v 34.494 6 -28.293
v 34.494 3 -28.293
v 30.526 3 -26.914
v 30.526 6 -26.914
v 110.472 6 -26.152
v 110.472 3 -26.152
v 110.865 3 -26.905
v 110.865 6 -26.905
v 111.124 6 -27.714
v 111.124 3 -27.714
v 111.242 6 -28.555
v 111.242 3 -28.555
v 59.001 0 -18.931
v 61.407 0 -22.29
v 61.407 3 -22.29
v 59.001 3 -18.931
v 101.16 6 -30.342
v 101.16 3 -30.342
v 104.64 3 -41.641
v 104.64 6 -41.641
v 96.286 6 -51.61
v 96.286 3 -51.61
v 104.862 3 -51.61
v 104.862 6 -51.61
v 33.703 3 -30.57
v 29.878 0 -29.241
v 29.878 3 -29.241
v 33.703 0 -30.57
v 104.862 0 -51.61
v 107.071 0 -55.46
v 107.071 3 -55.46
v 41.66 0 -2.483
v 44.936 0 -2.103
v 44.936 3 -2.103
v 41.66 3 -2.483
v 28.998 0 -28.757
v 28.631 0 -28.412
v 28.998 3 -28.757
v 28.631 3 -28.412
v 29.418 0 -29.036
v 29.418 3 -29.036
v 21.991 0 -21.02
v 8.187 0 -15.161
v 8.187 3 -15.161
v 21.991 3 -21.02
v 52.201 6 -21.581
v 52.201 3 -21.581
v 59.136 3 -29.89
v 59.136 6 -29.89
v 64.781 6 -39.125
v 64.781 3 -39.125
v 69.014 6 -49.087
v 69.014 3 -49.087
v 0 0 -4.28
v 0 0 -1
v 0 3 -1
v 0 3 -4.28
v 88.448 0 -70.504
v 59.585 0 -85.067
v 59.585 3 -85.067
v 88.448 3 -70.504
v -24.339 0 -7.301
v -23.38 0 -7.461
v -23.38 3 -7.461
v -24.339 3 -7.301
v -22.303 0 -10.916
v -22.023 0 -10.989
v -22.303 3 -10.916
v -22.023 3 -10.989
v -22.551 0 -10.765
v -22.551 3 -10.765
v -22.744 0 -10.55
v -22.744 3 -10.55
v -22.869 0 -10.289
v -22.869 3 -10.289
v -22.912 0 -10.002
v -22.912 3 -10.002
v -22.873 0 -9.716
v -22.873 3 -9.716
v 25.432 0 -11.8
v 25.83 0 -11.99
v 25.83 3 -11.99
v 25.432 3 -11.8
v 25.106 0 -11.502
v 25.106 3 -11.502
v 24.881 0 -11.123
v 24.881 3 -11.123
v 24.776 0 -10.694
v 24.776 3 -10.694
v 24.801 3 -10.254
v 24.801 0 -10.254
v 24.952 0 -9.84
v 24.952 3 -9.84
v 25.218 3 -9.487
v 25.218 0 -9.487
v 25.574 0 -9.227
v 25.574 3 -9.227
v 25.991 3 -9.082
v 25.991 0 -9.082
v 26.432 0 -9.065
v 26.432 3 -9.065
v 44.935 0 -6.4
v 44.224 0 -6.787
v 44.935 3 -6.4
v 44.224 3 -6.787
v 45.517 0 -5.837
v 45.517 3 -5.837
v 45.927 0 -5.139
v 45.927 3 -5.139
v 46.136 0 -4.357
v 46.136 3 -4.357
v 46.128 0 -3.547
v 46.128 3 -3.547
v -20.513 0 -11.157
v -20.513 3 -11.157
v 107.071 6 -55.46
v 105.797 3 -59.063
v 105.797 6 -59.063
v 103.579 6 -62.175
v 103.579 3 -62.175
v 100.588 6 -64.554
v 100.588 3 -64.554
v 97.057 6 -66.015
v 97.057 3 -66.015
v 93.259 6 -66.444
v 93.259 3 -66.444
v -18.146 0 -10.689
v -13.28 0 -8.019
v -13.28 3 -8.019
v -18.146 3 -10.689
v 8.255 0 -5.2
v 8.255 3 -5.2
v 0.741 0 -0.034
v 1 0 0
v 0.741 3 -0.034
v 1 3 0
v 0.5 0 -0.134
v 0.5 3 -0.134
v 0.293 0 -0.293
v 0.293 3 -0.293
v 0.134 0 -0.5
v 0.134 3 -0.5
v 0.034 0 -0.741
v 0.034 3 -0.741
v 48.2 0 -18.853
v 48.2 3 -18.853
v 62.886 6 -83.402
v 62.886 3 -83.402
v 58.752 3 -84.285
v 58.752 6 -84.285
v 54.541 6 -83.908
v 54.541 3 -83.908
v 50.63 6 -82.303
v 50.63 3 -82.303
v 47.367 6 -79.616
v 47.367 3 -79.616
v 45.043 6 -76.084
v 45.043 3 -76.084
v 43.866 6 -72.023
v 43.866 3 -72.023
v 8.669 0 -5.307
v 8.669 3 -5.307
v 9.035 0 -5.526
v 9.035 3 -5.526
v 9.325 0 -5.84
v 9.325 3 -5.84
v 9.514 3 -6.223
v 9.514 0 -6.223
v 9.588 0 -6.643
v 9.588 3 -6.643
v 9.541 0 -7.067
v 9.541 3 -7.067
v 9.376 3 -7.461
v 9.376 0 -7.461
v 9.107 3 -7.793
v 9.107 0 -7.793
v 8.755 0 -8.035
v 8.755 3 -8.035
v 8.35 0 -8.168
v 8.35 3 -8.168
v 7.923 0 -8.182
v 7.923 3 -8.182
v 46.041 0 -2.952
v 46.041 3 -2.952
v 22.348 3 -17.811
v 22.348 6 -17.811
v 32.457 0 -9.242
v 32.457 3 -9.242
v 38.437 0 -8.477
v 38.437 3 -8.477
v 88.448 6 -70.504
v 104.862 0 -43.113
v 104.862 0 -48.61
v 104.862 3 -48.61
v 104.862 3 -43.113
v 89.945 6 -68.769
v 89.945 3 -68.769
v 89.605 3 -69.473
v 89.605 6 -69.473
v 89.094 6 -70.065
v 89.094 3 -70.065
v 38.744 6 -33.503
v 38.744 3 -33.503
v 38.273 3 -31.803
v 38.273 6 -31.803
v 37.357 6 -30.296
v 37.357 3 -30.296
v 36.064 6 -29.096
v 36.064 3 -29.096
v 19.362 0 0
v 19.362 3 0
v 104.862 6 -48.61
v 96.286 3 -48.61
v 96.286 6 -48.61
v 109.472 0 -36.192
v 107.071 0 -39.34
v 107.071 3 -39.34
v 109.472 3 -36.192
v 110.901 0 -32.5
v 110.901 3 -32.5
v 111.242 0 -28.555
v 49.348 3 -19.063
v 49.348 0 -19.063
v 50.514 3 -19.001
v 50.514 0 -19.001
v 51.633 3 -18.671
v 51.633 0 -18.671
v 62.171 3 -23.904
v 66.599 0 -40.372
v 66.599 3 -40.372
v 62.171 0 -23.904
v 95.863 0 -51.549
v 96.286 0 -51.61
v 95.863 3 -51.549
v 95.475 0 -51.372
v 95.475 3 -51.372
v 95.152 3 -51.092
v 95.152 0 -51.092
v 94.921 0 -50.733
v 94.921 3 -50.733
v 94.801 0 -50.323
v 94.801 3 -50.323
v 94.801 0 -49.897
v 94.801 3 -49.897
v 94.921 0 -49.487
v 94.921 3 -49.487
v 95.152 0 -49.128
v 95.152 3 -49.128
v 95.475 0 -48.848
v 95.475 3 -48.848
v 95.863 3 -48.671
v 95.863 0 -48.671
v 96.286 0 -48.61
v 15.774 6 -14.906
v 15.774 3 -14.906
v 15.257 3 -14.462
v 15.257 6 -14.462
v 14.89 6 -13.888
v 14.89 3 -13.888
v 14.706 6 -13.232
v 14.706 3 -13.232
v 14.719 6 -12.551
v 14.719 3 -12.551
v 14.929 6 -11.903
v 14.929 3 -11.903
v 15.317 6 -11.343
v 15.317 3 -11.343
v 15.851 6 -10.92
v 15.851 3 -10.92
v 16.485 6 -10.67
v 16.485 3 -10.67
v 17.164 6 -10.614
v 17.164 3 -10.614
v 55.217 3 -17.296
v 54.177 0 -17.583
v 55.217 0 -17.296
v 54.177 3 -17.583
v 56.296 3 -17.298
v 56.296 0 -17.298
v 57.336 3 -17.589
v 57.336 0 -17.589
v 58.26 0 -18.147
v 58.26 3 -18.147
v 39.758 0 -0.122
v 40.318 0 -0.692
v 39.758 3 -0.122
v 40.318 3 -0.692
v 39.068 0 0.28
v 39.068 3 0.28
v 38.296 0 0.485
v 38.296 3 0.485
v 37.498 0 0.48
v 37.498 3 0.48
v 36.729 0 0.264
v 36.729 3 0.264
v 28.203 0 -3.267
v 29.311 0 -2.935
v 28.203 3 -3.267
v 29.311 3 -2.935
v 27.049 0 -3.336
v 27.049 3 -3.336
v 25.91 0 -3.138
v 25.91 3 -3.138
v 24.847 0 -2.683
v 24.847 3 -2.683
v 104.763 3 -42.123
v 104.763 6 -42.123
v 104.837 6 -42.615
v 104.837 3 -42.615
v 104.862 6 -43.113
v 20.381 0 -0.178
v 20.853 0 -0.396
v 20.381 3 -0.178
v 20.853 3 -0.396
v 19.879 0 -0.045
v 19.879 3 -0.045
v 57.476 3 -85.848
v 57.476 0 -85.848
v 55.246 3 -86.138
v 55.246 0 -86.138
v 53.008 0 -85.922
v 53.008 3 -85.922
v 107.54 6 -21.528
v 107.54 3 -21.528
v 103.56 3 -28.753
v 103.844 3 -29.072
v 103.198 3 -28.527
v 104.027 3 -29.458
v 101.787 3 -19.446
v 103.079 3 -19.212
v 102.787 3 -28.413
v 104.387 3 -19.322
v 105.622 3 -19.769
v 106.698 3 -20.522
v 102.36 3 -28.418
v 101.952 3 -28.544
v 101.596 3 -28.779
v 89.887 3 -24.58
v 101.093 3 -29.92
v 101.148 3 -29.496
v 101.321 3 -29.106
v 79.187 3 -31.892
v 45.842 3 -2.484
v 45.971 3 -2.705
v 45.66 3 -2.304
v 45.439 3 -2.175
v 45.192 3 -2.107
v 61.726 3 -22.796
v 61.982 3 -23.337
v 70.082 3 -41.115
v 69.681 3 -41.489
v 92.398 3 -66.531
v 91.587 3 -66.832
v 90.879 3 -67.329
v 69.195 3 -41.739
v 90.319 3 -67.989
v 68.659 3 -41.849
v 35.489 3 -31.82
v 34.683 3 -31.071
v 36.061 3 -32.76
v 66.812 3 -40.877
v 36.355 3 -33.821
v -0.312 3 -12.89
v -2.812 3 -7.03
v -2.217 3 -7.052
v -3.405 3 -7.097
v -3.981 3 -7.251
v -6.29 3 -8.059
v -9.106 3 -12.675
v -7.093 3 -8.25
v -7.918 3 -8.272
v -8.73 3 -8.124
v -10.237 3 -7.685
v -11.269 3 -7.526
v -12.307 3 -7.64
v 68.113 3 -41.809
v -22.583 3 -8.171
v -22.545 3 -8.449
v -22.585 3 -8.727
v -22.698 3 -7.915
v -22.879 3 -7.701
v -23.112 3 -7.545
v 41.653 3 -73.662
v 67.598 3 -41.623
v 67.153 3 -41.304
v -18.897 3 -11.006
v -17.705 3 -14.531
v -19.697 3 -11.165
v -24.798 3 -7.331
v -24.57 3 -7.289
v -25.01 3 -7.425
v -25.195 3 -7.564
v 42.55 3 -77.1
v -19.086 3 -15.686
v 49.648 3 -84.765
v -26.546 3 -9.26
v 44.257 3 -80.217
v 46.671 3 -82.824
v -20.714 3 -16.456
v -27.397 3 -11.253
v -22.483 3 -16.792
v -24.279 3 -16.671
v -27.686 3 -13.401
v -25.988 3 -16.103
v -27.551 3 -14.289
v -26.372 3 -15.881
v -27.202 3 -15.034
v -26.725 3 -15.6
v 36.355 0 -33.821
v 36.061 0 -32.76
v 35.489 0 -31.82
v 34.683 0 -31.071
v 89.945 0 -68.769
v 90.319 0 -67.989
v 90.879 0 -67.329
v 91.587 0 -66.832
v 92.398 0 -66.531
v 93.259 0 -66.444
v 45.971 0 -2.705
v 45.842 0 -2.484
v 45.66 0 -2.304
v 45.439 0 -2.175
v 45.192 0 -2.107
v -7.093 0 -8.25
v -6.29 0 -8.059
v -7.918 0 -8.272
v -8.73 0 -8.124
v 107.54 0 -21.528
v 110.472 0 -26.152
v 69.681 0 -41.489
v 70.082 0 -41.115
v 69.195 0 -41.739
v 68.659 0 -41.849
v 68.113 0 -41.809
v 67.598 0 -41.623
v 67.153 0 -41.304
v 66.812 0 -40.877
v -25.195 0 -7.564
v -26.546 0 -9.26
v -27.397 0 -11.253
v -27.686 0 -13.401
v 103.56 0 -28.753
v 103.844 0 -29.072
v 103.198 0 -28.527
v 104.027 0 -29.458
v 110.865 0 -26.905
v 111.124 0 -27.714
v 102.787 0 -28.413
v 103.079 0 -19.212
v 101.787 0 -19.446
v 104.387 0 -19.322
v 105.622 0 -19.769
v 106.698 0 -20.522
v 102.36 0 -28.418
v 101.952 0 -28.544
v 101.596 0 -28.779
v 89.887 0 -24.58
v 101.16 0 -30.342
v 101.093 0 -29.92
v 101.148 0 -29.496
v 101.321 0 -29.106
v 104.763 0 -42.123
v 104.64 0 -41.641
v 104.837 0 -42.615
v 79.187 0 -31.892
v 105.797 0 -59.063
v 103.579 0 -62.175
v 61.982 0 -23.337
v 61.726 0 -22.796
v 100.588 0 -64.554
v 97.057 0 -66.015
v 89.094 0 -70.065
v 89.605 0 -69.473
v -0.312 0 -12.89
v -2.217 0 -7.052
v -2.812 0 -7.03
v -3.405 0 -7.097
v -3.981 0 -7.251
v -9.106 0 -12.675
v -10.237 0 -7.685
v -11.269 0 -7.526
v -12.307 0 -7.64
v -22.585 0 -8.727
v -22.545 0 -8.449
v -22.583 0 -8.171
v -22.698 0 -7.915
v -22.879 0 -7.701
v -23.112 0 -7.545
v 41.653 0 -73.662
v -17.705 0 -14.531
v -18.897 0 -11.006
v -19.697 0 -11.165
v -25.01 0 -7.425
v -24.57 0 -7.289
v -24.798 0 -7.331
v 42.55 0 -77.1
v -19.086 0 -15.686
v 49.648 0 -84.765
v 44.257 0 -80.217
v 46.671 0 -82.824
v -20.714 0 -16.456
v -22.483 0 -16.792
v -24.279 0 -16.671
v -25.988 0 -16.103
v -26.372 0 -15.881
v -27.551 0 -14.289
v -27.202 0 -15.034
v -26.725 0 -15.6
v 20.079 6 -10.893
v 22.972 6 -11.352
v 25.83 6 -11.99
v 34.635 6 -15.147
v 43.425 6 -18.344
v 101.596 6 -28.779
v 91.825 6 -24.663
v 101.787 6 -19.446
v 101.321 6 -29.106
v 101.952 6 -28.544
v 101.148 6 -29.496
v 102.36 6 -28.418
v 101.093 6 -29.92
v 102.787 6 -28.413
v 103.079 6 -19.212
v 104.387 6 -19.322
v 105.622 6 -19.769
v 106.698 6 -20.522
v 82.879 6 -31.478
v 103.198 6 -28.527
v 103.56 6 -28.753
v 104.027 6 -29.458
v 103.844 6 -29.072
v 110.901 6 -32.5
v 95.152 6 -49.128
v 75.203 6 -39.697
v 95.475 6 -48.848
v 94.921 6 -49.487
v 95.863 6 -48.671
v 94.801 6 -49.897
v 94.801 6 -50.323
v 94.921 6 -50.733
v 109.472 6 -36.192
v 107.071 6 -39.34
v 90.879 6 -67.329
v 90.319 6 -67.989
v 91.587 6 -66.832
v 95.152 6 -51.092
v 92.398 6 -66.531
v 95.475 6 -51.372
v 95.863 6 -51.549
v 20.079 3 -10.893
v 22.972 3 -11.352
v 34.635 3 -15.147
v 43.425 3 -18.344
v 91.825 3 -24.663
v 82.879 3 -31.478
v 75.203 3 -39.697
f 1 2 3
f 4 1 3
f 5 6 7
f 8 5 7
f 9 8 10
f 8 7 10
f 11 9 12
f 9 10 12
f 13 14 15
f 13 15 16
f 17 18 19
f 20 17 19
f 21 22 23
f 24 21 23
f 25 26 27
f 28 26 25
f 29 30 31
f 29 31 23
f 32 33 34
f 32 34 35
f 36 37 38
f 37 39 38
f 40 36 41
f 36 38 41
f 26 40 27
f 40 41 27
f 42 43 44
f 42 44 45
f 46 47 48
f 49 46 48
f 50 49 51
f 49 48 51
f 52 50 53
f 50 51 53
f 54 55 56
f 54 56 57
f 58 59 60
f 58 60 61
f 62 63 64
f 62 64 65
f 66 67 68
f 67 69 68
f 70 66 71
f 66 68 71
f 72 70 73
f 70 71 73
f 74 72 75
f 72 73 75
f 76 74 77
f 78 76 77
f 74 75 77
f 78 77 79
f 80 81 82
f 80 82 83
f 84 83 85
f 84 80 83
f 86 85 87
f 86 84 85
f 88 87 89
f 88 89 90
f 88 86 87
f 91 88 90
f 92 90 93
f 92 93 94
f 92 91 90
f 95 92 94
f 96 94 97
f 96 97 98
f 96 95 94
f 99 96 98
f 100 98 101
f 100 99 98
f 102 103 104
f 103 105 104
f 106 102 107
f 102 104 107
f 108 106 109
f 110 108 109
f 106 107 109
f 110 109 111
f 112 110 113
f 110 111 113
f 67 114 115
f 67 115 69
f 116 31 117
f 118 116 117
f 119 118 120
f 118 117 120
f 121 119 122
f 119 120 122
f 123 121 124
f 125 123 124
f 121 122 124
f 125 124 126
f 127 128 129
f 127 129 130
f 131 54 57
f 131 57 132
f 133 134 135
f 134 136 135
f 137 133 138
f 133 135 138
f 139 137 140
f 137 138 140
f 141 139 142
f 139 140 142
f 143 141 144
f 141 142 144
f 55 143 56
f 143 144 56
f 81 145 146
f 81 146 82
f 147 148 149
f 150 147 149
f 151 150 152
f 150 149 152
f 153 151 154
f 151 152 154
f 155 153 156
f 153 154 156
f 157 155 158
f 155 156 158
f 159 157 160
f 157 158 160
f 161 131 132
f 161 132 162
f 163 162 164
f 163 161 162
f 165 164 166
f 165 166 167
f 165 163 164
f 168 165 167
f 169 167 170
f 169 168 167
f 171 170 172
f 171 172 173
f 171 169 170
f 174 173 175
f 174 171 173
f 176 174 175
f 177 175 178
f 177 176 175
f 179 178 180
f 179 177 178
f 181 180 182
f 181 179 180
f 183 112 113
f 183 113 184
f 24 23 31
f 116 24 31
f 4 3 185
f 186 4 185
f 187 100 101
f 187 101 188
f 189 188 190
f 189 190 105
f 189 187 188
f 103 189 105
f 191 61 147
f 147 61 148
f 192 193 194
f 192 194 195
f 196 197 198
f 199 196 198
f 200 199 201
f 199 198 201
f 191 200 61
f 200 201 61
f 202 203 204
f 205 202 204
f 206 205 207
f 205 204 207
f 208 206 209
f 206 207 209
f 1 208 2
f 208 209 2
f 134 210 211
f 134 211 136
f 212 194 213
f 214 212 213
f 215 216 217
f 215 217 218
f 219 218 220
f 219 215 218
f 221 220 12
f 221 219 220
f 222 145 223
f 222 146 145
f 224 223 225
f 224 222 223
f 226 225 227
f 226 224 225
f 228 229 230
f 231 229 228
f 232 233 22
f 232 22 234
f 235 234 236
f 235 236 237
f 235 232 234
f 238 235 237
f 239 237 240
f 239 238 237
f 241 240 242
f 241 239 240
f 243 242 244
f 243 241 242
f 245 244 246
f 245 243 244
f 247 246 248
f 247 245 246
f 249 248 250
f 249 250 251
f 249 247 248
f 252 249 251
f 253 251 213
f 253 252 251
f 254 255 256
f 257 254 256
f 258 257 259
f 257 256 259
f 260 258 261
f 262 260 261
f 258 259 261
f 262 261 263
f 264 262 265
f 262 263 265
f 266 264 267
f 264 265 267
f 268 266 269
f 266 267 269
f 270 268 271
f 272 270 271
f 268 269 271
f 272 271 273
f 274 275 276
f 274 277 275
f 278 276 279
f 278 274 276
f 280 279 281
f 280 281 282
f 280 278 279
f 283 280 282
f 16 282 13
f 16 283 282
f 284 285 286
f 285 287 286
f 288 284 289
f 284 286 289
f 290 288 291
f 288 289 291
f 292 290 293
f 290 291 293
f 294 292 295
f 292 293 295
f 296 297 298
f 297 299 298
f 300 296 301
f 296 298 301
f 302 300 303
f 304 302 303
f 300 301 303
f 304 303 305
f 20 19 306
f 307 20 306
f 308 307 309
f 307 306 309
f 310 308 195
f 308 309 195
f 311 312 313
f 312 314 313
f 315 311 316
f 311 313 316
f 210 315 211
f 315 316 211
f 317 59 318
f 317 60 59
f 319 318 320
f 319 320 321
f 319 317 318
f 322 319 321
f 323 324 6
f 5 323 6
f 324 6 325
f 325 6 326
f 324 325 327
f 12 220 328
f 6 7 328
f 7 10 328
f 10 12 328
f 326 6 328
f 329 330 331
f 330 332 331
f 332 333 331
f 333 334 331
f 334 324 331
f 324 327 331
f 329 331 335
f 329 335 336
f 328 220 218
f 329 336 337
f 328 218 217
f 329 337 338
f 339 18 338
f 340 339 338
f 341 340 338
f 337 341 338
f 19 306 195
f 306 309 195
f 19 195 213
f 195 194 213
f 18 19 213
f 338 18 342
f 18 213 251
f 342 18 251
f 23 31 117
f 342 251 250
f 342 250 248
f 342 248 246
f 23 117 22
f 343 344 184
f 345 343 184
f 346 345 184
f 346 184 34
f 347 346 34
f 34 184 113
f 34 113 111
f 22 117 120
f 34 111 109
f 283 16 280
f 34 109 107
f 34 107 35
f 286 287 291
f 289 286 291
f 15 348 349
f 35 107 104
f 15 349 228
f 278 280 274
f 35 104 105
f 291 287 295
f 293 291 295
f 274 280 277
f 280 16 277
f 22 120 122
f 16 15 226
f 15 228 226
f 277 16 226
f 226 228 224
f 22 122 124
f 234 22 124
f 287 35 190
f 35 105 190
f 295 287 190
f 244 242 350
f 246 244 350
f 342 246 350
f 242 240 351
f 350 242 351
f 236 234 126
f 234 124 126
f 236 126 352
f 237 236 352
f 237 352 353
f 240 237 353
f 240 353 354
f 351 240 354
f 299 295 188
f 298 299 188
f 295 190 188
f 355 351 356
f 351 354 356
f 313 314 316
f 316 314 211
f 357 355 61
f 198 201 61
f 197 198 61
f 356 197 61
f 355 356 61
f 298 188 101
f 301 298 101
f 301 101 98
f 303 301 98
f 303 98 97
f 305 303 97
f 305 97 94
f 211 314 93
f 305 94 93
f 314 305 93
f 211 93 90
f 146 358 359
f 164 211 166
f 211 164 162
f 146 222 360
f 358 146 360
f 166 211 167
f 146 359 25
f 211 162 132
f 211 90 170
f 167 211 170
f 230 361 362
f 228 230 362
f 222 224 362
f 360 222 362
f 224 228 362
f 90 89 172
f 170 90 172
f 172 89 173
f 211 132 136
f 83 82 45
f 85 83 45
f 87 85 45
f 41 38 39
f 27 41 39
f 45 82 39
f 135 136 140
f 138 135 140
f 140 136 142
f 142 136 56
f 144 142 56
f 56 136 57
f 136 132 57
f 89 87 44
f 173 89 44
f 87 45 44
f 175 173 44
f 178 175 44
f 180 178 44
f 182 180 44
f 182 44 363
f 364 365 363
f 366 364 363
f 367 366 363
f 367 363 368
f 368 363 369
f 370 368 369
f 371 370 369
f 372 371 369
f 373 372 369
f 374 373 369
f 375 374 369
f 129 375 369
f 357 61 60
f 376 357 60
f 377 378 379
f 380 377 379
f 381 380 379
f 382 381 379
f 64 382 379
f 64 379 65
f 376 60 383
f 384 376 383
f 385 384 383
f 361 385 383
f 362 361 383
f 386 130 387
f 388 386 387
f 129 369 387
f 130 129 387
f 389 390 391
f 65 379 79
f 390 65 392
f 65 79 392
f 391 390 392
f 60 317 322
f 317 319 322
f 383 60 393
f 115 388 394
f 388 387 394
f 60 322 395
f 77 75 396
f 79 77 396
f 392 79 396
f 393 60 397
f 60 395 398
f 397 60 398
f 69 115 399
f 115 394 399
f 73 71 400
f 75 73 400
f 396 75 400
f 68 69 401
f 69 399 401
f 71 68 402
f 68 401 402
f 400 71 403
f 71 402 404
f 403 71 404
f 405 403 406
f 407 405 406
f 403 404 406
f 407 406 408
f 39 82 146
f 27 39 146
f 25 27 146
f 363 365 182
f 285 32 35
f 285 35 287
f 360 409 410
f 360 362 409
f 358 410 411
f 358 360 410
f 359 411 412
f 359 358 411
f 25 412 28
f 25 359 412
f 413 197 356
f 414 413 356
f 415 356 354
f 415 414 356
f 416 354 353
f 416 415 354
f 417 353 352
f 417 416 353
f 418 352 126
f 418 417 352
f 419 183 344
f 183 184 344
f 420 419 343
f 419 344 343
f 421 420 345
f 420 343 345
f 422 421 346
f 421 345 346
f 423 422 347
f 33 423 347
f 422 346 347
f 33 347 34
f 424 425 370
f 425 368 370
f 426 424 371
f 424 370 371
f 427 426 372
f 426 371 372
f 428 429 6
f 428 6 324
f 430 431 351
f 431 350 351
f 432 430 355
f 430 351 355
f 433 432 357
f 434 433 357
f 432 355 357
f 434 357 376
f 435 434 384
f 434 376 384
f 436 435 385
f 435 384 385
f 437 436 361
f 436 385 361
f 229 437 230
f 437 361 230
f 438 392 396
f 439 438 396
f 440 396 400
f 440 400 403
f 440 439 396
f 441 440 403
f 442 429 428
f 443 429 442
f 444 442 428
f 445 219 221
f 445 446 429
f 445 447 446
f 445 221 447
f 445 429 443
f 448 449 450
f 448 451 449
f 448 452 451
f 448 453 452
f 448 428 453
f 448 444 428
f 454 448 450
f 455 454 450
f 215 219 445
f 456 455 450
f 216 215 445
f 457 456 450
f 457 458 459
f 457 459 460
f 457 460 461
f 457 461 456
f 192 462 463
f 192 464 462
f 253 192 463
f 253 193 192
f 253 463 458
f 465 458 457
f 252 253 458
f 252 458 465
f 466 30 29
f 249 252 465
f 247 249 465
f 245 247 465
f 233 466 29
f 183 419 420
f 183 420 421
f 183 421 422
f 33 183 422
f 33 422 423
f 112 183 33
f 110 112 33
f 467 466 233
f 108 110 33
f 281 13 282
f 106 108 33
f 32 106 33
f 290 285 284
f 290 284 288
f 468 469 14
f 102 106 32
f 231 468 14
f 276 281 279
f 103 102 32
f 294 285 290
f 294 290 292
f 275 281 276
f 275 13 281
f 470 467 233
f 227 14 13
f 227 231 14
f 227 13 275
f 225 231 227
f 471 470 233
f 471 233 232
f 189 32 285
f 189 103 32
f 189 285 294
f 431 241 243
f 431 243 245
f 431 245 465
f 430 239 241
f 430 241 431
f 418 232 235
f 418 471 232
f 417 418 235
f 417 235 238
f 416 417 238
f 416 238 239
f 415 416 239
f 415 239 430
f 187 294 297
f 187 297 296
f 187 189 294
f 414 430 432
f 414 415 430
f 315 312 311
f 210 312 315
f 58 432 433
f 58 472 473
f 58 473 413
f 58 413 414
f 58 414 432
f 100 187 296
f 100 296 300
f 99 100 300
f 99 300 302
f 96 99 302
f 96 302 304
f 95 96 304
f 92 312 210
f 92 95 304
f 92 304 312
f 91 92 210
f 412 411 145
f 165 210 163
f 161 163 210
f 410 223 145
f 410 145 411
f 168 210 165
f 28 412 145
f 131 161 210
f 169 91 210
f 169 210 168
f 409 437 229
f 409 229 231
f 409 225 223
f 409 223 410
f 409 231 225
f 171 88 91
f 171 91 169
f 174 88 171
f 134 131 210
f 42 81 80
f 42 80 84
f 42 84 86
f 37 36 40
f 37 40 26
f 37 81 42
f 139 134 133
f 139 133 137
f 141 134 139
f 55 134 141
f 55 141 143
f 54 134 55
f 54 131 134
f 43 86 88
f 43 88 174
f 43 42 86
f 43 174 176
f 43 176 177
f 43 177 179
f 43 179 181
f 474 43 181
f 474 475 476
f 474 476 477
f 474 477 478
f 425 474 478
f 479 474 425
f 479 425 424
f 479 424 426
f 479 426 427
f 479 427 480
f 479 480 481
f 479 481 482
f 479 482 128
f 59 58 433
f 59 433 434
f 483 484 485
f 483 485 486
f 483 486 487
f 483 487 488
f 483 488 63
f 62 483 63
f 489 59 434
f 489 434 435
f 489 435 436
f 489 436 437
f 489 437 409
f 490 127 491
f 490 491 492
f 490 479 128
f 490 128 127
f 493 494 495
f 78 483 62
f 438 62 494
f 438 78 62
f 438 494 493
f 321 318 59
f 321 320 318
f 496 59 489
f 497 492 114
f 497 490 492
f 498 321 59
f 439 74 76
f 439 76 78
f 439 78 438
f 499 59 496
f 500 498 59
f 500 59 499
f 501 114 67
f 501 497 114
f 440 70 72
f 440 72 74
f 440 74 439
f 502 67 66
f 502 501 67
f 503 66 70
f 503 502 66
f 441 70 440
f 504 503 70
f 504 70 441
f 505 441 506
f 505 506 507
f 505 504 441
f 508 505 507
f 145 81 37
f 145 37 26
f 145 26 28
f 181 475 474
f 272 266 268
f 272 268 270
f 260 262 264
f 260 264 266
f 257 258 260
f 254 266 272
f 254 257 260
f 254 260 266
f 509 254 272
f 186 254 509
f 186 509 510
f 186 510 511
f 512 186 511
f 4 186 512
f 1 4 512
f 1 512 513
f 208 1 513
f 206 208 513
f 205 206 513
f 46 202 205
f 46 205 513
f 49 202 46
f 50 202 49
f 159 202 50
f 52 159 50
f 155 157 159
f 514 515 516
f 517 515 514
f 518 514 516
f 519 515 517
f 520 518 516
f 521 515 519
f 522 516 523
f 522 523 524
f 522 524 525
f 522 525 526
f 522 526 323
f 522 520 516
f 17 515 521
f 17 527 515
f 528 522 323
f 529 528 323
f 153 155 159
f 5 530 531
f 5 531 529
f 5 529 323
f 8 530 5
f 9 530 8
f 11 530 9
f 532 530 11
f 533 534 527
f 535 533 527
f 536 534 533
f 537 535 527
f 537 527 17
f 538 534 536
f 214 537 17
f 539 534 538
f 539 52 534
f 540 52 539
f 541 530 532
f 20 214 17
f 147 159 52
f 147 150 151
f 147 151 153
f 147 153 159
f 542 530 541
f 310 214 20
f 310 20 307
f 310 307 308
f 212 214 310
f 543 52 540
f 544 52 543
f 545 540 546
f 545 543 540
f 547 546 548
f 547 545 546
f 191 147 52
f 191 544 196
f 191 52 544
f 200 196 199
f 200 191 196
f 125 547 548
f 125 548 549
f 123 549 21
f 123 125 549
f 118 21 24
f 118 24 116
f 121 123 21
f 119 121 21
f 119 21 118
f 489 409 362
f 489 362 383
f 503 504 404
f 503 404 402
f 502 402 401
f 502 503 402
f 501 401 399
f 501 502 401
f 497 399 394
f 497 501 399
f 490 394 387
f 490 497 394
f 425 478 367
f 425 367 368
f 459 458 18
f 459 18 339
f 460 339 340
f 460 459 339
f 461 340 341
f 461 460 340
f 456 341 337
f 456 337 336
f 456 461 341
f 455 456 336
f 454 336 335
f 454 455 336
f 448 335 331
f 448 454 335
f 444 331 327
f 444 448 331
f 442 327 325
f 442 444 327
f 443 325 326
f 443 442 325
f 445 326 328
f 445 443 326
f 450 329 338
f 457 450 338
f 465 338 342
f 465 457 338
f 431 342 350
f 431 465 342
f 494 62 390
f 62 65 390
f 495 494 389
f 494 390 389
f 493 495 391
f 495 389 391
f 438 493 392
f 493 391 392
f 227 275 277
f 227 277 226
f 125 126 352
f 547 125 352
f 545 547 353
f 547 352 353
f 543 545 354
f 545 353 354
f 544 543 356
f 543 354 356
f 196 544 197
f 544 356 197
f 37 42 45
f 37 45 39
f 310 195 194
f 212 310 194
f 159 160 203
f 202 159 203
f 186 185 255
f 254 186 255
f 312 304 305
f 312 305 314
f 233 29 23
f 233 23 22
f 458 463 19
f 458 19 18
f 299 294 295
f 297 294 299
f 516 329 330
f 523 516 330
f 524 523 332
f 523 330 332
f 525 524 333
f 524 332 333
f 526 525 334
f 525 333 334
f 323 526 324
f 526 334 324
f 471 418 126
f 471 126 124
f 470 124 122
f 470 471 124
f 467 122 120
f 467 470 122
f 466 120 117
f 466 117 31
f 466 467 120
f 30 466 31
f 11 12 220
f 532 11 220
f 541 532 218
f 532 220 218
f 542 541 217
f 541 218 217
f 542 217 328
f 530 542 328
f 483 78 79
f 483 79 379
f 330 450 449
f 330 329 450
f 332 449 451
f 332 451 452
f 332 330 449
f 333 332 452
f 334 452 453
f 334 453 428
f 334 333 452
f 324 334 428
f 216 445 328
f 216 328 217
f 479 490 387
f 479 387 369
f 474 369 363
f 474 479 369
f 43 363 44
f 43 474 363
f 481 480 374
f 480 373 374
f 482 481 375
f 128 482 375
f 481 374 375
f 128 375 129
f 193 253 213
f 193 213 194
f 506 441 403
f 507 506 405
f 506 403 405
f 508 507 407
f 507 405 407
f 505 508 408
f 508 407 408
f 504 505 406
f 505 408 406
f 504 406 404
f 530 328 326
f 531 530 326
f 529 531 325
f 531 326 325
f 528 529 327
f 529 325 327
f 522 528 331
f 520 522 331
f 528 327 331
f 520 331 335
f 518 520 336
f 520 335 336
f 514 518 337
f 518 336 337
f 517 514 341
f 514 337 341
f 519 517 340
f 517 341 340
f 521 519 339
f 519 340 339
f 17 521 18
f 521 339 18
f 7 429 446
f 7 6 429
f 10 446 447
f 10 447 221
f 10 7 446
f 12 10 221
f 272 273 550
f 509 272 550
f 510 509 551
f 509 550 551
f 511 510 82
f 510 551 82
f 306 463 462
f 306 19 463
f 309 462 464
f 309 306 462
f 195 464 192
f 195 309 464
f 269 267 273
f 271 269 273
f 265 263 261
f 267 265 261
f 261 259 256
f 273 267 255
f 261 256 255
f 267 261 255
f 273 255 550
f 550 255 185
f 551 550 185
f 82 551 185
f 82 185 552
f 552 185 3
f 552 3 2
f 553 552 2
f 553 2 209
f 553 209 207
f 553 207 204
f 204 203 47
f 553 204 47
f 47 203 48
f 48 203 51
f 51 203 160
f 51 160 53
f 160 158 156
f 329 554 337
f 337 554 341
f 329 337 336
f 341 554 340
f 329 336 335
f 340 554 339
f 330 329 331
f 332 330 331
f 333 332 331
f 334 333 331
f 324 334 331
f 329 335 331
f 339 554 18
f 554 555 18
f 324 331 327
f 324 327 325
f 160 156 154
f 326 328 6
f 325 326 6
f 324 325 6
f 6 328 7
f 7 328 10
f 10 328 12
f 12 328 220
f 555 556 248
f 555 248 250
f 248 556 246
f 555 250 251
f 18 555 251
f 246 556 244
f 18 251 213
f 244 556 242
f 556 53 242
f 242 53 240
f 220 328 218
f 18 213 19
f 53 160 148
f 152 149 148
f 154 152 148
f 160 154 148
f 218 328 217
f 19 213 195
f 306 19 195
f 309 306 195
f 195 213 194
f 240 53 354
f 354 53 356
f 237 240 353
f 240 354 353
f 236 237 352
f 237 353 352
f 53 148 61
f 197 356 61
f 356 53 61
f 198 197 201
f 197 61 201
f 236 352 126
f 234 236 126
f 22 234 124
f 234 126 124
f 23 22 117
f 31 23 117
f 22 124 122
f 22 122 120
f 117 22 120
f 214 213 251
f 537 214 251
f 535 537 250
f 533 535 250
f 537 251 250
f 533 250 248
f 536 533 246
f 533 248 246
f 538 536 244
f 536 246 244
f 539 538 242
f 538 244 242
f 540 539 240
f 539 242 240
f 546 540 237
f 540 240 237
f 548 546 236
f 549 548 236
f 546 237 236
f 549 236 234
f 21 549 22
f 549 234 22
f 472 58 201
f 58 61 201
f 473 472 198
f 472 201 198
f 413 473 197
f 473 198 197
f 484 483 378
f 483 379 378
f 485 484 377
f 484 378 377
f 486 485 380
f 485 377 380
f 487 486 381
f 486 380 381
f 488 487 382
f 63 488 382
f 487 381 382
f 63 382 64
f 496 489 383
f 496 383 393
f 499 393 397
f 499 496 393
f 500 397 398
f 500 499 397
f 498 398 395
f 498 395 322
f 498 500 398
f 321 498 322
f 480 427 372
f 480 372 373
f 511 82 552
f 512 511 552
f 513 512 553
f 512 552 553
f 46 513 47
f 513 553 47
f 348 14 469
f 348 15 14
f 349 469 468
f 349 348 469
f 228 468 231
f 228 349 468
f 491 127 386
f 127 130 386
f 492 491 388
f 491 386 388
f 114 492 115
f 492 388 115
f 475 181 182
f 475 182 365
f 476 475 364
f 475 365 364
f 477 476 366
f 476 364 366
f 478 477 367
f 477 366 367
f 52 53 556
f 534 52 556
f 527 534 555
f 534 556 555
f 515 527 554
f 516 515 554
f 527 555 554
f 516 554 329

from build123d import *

# Parameters (mm, degrees)
BOSS_EXTRUDE1_DEPTH = 3
FILLET1_R           = 3
FILLET2_R           = 5
FILLET3_R           = 4
FILLET4_R           = 1
FILLET5_R           = 10
FILLET6_R           = 2
BOSS_EXTRUDE2_DEPTH = 3


with BuildPart() as part:
    # Sketch2 → Boss-Extrude1 (new body)
    with BuildSketch(Plane(origin=(0, 0, 0), x_dir=(1, 0, 0), z_dir=(0, 1, 0))):
        with BuildLine():
            Line((104.861742338, 51.61), (96.285742338, 51.61))
            ThreePointArc((96.285742338, 51.61), (94.785742338, 50.11), (96.285742338, 48.61))
            Line((96.285742338, 48.61), (104.861742338, 48.61))
            Line((104.861742338, 48.61), (104.861742338, 42.36))
            Line((104.861742338, 42.36), (101.159535482, 30.341590159))
            ThreePointArc((101.159535482, 30.341590159), (102.15147179, 28.466473533), (104.026588416, 29.458409841))
            Line((104.026588416, 29.458409841), (107.0705594, 39.34))
            ThreePointArc((107.0705594, 39.34), (110.559148386, 33.719570051), (111.09, 27.125809175))
            Line((111.09, 27.125809175), (105.531161353, 18.360668643))
            ThreePointArc((105.531161353, 18.360668643), (84.319857644, 28.006827284), (67.651742338, 44.29))
            Line((67.651742338, 44.29), (61.935762488, 23.027584397))
            Line((61.935762488, 23.027584397), (57.13, 16.32))
            Line((57.13, 16.32), (49.95, 19.39))
            Line((49.95, 19.39), (25.830040494, 11.99))
            ThreePointArc((25.830040494, 11.99), (24.800734775, 10.253880031), (26.431506195, 9.064692331))
            ThreePointArc((26.431506195, 9.064692331), (36.664028635, 8.803570476), (46.46571567, 5.854056721))
            Line((46.46571567, 5.854056721), (45.9, 1.991540554))
            Line((45.9, 1.991540554), (41.660045255, 2.482673431))
            Line((41.660045255, 2.482673431), (38.9, -1.2))
            Line((38.9, -1.2), (27.015518097, 3.924692331))
            Line((27.015518097, 3.924692331), (20.16, 0))
            Line((20.16, 0), (0, 0))
            Line((0, 0), (0, 4.28))
            Line((0, 4.28), (8.255364291, 5.2))
            ThreePointArc((8.255364291, 5.2), (9.58, 6.856906829), (7.923093171, 8.181542538))
            Line((7.923093171, 8.181542538), (-3.121398875, 6.950714639))
            Line((-3.121398875, 6.950714639), (-7.499203077, 8.482641989))
            Line((-7.499203077, 8.482641989), (-11.827625236, 7.22158903))
            Line((-11.827625236, 7.22158903), (-19.255161489, 11.297641869))
            Line((-19.255161489, 11.297641869), (-23.205269456, 10.857431213))
            Line((-23.205269456, 10.857431213), (-22.269740859, 7.646334739))
            Line((-22.269740859, 7.646334739), (-24.812537217, 7.22158903))
            ThreePointArc((-24.812537217, 7.22158903), (-27.256062178, 10.796585791), (-27.5, 15.12))
            ThreePointArc((-27.5, 15.12), (-22.484233626, 16.792009689), (-17.704912147, 14.531121607))
            ThreePointArc((-17.704912147, 14.531121607), (-4.702395419, 12.521774189), (8.186937419, 15.161474421))
            Line((8.186937419, 15.161474421), (21.991482078, 21.019847276))
            Line((21.991482078, 21.019847276), (29.148159429, 28.986869108))
            Line((29.148159429, 28.986869108), (36.03, 31.378427725))
            Line((36.03, 31.378427725), (41.652863678, 73.662098134))
            ThreePointArc((41.652863678, 73.662098134), (47.001876481, 83.094401265), (57.4, 86.17))
            Line((57.4, 86.17), (89.772823478, 69.836247096))
            ThreePointArc((89.772823478, 69.836247096), (90.799785464, 67.40403524), (93.25912827, 66.443859006))
            ThreePointArc((93.25912827, 66.443859006), (102.166931279, 63.469413825), (107.0705594, 55.46))
            Line((107.0705594, 55.46), (104.861742338, 51.61))
        make_face()
    extrude(amount=BOSS_EXTRUDE1_DEPTH)

    # Fillet1
    fillet1_edges = [part.edges().sort_by_distance(p)[0] for p in [
        (46.46571567, 1.5, -5.854056721),
        (38.9, 1.5, 1.2),
        (20.16, 1.5, 0),
        (-27.5, 1.5, -15.12),
        (29.148159429, 1.5, -28.986869108),
        (89.772823478, 1.5, -69.836247096),
    ]]
    fillet(fillet1_edges, radius=FILLET1_R)

    # Fillet2
    fillet2_edges = [part.edges().sort_by_distance(p)[0] for p in [
        (104.861742338, 1.5, -42.36),
        (111.09, 1.5, -27.125809175),
        (105.531161353, 1.5, -18.360668643),
        (61.935762488, 1.5, -23.027584397),
        (49.95, 1.5, -19.39),
        (27.015518097, 1.5, -3.924692331),
    ]]
    fillet(fillet2_edges, radius=FILLET2_R)

    # Fillet3
    fillet3_edges = [part.edges().sort_by_distance(p)[0] for p in [
        (57.13, 1.5, -16.32),
        (-3.121398875, 1.5, -6.950714639),
        (-7.499203077, 1.5, -8.482641989),
        (-11.827625236, 1.5, -7.22158903),
        (-19.255161489, 1.5, -11.297641869),
        (36.03, 1.5, -31.378427725),
    ]]
    fillet(fillet3_edges, radius=FILLET3_R)

    # Fillet4
    fillet4_edges = [part.edges().sort_by_distance(p)[0] for p in [
        (45.9, 1.5, -1.991540554),
        (0, 1.5, 0),
        (-23.205269456, 1.5, -10.857431213),
        (-22.269740859, 1.5, -7.646334739),
        (-24.812537217, 1.5, -7.22158903),
    ]]
    fillet(fillet4_edges, radius=FILLET4_R)

    # Fillet5
    fillet5_edges = [part.edges().sort_by_distance(p)[0] for p in [
        (57.4, 1.5, -86.17),
    ]]
    fillet(fillet5_edges, radius=FILLET5_R)

    # Fillet6
    fillet6_edges = [part.edges().sort_by_distance(p)[0] for p in [
        (67.651742338, 1.5, -44.29),
    ]]
    fillet(fillet6_edges, radius=FILLET6_R)


with BuildPart() as body_2:
    # Sketch3 → Boss-Extrude2 (new body)
    with BuildSketch(Plane(origin=(0, 3, 0), x_dir=(1, 0, 0), z_dir=(0, 1, 0))):
        with BuildLine():
            Line((104.861742338, 48.61), (96.285742338, 48.61))
            ThreePointArc((96.285742338, 48.61), (94.785742338, 50.11), (96.285742338, 51.61))
            Line((96.285742338, 51.61), (104.861742338, 51.61))
            Line((104.861742338, 51.61), (107.0705594, 55.46))
            ThreePointArc((107.0705594, 55.46), (102.166931279, 63.469413825), (93.25912827, 66.443859006))
            ThreePointArc((93.25912827, 66.443859006), (91.217265508, 67.058215862), (89.944912878, 68.769284731))
            ThreePointArc((89.944912878, 68.769284731), (89.368859073, 69.785382473), (88.448424673, 70.504474347))
            Line((88.448424673, 70.504474347), (62.886391144, 83.401833753))
            ThreePointArc((62.886391144, 83.401833753), (50.629889119, 82.303384138), (43.866151343, 72.023292468))
            Line((43.866151343, 72.023292468), (38.743746243, 33.50304703))
            ThreePointArc((38.743746243, 33.50304703), (37.356668761, 30.29620131), (34.493830529, 28.293203387))
            Line((34.493830529, 28.293203387), (30.525960235, 26.914299837))
            Line((30.525960235, 26.914299837), (22.34841713, 17.810820491))
            Line((22.34841713, 17.810820491), (15.773824722, 14.905675932))
            ThreePointArc((15.773824722, 14.905675932), (14.800041257, 12.21917328), (17.163927201, 10.613684575))
            ThreePointArc((17.163927201, 10.613684575), (21.529057218, 11.09988897), (25.830040494, 11.99))
            ThreePointArc((25.830040494, 11.99), (39.031835006, 16.740180215), (52.200742429, 21.580786346))
            ThreePointArc((52.200742429, 21.580786346), (62.128366101, 34.40394722), (69.014066143, 49.086532194))
            ThreePointArc((69.014066143, 49.086532194), (82.878604374, 31.477866982), (101.787139988, 19.446333753))
            ThreePointArc((101.787139988, 19.446333753), (105.019281146, 19.504746746), (107.540156963, 21.528439821))
            Line((107.540156963, 21.528439821), (110.472177565, 26.151630788))
            ThreePointArc((110.472177565, 26.151630788), (111.011310028, 27.303917414), (111.242191732, 28.554965743))
            ThreePointArc((111.242191732, 28.554965743), (110.317052398, 34.396430634), (107.0705594, 39.34))
            Line((107.0705594, 39.34), (104.026588416, 29.458409841))
            ThreePointArc((104.026588416, 29.458409841), (102.15147179, 28.466473533), (101.159535482, 30.341590159))
            Line((101.159535482, 30.341590159), (104.640163894, 41.640693745))
            ThreePointArc((104.640163894, 41.640693745), (104.806037423, 42.368385383), (104.861742338, 43.112660943))
            Line((104.861742338, 43.112660943), (104.861742338, 48.61))
        make_face()
    extrude(amount=BOSS_EXTRUDE2_DEPTH)


solid = Compound([part.part, body_2.part])
